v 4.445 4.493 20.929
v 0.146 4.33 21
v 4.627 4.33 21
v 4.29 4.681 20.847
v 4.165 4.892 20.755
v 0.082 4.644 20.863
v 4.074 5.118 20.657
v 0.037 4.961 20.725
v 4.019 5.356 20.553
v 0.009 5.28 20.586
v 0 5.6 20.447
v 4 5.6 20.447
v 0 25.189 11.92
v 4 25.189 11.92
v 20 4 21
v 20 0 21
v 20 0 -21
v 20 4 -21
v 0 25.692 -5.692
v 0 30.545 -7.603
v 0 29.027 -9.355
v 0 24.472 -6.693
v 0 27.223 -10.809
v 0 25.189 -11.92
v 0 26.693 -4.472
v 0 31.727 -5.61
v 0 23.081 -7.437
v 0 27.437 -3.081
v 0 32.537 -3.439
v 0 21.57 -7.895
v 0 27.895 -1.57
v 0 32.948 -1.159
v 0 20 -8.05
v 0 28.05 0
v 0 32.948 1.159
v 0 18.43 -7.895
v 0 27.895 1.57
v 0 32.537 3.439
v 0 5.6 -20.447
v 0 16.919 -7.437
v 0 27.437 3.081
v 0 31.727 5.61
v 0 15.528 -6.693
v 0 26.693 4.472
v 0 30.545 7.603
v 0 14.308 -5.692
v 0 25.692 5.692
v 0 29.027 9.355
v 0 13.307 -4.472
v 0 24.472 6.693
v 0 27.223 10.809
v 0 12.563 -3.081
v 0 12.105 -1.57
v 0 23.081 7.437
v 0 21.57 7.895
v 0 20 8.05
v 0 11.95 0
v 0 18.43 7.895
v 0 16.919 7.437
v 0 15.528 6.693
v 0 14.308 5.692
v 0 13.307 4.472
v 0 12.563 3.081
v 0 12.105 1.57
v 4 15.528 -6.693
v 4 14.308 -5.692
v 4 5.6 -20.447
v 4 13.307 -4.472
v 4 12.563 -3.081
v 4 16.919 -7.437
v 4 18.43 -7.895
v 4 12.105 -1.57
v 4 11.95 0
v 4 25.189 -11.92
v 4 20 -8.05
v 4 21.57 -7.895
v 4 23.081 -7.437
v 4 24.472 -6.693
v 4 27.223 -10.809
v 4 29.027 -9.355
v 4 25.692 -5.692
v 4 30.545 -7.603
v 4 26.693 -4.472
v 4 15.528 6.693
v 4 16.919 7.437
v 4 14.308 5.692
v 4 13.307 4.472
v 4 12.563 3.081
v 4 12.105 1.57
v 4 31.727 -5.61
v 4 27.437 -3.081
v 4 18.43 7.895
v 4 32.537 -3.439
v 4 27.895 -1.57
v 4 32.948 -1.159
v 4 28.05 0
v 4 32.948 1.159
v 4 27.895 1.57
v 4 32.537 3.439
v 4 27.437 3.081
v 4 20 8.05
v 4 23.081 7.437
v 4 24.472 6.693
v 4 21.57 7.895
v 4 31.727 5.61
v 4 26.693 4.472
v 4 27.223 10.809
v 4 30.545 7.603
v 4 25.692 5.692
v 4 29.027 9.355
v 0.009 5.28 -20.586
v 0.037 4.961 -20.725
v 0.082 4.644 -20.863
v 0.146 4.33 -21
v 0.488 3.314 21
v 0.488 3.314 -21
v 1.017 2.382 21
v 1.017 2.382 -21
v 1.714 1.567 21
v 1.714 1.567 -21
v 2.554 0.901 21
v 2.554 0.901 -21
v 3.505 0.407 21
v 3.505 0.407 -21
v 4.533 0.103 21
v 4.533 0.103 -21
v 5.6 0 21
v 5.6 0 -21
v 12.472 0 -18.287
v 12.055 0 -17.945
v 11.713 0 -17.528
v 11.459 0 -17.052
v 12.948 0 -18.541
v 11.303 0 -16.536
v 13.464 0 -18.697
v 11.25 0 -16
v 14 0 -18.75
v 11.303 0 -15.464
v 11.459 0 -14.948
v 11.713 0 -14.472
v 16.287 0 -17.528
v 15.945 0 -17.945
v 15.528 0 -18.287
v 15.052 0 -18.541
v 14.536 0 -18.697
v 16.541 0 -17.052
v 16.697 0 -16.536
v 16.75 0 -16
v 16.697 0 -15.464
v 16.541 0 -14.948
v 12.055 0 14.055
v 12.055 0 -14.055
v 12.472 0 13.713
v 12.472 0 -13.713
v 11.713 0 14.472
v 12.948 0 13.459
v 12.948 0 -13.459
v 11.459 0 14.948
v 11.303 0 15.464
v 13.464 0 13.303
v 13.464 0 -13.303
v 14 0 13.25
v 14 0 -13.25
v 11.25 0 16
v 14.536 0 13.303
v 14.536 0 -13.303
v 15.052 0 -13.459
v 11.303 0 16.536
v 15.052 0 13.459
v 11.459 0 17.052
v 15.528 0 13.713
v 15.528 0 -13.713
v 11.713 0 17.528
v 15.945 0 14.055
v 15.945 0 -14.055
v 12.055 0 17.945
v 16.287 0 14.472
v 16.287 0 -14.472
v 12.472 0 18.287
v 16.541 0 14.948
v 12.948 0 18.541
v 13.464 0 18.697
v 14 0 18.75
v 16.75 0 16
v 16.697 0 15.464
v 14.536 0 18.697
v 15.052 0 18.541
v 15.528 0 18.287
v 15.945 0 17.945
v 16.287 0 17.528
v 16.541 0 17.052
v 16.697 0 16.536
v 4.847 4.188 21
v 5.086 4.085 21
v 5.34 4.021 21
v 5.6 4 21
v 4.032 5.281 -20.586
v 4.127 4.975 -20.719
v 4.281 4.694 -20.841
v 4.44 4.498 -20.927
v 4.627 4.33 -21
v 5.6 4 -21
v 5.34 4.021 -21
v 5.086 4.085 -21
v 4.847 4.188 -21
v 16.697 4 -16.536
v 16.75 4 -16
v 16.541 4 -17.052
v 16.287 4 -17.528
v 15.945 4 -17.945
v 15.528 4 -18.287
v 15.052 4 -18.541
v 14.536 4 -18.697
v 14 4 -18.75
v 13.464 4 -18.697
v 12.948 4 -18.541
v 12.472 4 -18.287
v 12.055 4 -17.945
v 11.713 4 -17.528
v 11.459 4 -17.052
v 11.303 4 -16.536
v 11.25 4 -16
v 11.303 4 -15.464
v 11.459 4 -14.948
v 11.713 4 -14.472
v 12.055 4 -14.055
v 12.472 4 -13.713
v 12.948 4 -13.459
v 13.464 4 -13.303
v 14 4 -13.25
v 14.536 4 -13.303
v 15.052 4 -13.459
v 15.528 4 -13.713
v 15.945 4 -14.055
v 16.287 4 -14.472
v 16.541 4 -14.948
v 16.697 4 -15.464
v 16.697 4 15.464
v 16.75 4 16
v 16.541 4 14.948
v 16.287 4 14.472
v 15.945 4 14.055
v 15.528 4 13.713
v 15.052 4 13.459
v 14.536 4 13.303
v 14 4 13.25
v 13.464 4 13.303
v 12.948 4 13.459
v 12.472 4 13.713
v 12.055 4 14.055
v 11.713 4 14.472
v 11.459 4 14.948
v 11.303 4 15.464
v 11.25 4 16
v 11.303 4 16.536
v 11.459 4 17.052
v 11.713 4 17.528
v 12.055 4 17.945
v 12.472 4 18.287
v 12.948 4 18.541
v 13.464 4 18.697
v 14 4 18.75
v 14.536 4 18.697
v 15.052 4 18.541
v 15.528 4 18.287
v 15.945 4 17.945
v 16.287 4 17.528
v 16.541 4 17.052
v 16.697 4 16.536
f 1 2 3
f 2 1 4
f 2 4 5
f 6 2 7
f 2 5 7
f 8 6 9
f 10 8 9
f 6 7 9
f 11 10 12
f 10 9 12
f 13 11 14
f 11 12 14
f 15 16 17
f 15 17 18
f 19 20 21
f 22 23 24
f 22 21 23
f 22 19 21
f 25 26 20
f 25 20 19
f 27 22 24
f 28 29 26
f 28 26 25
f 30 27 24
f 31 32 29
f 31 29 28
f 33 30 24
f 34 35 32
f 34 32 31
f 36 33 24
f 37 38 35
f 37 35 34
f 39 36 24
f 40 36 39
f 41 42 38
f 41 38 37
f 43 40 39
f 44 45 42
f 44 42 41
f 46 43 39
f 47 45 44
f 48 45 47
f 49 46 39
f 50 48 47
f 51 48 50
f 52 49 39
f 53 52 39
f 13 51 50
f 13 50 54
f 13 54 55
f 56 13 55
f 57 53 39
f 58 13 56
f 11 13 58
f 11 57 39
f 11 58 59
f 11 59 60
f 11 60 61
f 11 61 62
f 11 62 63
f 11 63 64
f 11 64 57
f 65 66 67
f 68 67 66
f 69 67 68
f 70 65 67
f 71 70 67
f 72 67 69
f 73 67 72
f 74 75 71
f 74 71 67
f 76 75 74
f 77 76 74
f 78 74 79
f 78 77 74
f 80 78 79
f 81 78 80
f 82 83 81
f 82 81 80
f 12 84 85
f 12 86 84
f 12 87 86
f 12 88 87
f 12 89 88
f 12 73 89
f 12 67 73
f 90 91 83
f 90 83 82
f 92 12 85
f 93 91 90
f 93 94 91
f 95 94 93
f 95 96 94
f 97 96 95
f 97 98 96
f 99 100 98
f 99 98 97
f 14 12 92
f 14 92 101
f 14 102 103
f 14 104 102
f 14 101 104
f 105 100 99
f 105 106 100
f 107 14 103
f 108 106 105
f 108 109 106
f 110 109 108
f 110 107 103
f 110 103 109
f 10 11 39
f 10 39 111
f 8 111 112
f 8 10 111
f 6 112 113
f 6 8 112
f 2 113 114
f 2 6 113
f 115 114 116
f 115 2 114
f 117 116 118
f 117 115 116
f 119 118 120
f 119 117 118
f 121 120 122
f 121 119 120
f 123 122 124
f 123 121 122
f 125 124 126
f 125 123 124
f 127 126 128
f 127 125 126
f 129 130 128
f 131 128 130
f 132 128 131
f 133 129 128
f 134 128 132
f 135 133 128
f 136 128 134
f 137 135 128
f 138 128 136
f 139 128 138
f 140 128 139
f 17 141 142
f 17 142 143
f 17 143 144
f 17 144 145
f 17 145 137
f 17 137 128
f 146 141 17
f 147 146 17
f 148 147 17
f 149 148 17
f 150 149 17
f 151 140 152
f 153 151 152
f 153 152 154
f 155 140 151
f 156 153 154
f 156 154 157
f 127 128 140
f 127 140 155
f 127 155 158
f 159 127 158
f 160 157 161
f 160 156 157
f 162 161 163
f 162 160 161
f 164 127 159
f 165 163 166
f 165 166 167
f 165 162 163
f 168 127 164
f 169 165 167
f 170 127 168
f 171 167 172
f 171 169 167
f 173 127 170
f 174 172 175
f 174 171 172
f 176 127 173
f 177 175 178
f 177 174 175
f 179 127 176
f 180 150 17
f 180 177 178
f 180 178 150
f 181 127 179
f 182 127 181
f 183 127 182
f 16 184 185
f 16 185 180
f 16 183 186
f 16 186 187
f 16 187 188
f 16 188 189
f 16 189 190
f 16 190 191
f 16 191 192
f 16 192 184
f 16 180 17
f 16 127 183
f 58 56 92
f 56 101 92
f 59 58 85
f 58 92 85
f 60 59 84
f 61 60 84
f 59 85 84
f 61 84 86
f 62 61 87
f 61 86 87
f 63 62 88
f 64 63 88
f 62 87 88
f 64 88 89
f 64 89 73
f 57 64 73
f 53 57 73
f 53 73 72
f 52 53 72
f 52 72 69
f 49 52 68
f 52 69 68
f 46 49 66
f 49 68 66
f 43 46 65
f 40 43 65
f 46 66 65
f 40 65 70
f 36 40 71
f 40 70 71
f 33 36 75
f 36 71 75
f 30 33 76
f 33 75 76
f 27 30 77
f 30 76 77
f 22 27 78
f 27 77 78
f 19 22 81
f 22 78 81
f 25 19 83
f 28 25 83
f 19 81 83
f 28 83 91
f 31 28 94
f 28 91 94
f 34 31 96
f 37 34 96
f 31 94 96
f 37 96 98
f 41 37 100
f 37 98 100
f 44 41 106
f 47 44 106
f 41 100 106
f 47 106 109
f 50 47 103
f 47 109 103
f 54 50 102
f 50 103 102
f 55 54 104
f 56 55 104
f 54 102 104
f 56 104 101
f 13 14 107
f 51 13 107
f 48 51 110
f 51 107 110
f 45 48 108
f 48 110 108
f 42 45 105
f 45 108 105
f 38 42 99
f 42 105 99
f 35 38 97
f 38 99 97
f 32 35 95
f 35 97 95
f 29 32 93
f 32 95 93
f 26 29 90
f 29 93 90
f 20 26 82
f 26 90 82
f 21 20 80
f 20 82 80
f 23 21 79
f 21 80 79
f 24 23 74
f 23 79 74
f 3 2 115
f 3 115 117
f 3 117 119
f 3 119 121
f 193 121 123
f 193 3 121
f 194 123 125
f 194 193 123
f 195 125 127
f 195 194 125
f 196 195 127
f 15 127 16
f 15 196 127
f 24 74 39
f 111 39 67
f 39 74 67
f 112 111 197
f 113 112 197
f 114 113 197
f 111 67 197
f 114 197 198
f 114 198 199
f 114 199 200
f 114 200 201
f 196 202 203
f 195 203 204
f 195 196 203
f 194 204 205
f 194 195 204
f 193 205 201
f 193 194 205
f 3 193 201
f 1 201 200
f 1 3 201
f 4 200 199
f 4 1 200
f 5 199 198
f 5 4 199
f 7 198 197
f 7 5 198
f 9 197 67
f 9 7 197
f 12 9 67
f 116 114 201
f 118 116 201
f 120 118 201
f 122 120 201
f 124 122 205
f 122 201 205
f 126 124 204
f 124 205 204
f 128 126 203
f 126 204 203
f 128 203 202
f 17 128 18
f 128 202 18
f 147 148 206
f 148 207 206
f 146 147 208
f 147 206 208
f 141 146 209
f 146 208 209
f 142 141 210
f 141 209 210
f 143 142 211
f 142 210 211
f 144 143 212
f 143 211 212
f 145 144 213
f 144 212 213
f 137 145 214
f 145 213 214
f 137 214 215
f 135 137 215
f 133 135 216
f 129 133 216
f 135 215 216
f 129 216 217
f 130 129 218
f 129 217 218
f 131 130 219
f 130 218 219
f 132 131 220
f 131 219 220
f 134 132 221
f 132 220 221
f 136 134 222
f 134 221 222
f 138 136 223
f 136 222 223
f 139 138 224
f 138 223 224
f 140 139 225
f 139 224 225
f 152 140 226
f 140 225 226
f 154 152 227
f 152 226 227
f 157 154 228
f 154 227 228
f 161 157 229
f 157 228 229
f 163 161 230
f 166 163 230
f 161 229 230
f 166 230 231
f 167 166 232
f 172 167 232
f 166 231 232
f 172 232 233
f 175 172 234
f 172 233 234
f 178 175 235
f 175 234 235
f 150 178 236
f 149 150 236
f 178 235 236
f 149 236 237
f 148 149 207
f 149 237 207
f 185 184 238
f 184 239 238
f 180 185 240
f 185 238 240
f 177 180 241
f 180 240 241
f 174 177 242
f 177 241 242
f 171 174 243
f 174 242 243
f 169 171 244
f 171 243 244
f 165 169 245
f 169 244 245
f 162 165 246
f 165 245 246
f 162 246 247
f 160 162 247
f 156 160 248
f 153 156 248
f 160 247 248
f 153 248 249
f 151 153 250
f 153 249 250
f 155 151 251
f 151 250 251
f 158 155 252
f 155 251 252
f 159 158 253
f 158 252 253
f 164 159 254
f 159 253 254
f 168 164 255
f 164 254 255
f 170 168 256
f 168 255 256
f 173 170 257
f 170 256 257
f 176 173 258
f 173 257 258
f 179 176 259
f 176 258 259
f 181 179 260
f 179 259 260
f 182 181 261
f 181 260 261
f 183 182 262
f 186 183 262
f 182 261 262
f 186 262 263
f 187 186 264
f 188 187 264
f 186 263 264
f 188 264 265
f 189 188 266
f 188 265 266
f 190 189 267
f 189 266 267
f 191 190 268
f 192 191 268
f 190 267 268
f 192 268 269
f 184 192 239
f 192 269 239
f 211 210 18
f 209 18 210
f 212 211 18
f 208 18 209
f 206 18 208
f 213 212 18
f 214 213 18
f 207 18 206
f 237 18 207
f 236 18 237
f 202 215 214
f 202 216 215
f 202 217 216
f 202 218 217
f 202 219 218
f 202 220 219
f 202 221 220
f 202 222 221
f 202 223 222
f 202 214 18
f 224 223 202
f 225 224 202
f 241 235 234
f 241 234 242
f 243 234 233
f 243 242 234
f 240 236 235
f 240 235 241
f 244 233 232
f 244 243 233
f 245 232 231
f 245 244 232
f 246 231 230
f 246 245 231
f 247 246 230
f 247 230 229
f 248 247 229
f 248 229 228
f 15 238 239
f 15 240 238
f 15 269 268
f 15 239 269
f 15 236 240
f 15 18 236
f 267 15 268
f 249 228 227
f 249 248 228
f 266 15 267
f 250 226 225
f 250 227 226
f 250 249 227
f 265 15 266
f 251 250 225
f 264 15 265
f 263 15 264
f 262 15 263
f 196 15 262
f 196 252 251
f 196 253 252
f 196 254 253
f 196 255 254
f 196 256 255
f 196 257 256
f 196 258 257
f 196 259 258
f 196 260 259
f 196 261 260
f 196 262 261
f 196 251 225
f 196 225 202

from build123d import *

# Parameters (mm, degrees)
EXTRUSION1_DEPTH      = 21
EXTRUSION1_DEPTH_BACK = 21
EXTRUSION2_DEPTH      = 14
SKIZZE3_R             = 8.05
EXTRUSION3_DEPTH      = 4.1
SKIZZE4_R             = 2.75
EXTRUSION4_DEPTH      = 4.1
SKIZZE5_R             = 2.75
EXTRUSION5_DEPTH      = 4.1


with BuildPart() as part:
    # Skizze1 → Extrusion1 (new body, two sides)
    with BuildSketch(Plane.XY) as extrusion1_sk:
        with BuildLine():
            Line((0, 40), (0, 5.6))
            ThreePointArc((0, 5.6), (1.640202025, 1.640202025), (5.6, 0))
            Line((5.6, 0), (20, 0))
            Line((20, 0), (20, 4))
            Line((20, 4), (5.6, 4))
            ThreePointArc((5.6, 4), (4.46862915, 4.46862915), (4, 5.6))
            Line((4, 5.6), (4, 40))
            Line((4, 40), (0, 40))
        make_face()
    extrude(amount=EXTRUSION1_DEPTH)
    extrude(extrusion1_sk.sketch, amount=-EXTRUSION1_DEPTH_BACK)

    # Skizze2 → Extrusion2 (cut, symmetric)
    with BuildSketch(Plane.YZ):
        with BuildLine():
            Line((64.1, 63.1), (-1, 63.1))
            Line((-1, 63.1), (-1, 23.320142873))
            Line((-1, 23.320142873), (25.188847397, 11.919557991))
            ThreePointArc((25.188847397, 11.919557991), (33, 0), (25.188847397, -11.919557991))
            Line((25.188847397, -11.919557991), (-1, -23.320142873))
            Line((-1, -23.320142873), (-1, -63.1))
            Line((-1, -63.1), (64.1, -63.1))
            Line((64.1, -63.1), (64.1, 63.1))
        make_face()
    extrude(amount=EXTRUSION2_DEPTH, both=True, mode=Mode.SUBTRACT)

    # Skizze3 → Extrusion3 (cut, symmetric)
    with BuildSketch(Plane.YZ):
        with Locations(Location((20, 0, 0), (0, 0, 90))):  # turned: the seam where the file's is
            Circle(SKIZZE3_R)
    extrude(amount=EXTRUSION3_DEPTH, both=True, mode=Mode.SUBTRACT)

    # Skizze4 → Extrusion4 (cut, symmetric)
    with BuildSketch(Plane(origin=(0, 0, 0), x_dir=(-1, 0, 0), z_dir=(0, 1, 0))):
        with Locations(Location((-14, -16, 0), (0, 0, 180))):  # turned: the seam where the file's is
            Circle(SKIZZE4_R)
    extrude(amount=EXTRUSION4_DEPTH, both=True, mode=Mode.SUBTRACT)

    # Skizze5 → Extrusion5 (cut, symmetric)
    with BuildSketch(Plane(origin=(0, 0, 0), x_dir=(-1, 0, 0), z_dir=(0, 1, 0))):
        with Locations(Location((-14, 16, 0), (0, 0, 180))):  # turned: the seam where the file's is
            Circle(SKIZZE5_R)
    extrude(amount=EXTRUSION5_DEPTH, both=True, mode=Mode.SUBTRACT)


solid = part.part
